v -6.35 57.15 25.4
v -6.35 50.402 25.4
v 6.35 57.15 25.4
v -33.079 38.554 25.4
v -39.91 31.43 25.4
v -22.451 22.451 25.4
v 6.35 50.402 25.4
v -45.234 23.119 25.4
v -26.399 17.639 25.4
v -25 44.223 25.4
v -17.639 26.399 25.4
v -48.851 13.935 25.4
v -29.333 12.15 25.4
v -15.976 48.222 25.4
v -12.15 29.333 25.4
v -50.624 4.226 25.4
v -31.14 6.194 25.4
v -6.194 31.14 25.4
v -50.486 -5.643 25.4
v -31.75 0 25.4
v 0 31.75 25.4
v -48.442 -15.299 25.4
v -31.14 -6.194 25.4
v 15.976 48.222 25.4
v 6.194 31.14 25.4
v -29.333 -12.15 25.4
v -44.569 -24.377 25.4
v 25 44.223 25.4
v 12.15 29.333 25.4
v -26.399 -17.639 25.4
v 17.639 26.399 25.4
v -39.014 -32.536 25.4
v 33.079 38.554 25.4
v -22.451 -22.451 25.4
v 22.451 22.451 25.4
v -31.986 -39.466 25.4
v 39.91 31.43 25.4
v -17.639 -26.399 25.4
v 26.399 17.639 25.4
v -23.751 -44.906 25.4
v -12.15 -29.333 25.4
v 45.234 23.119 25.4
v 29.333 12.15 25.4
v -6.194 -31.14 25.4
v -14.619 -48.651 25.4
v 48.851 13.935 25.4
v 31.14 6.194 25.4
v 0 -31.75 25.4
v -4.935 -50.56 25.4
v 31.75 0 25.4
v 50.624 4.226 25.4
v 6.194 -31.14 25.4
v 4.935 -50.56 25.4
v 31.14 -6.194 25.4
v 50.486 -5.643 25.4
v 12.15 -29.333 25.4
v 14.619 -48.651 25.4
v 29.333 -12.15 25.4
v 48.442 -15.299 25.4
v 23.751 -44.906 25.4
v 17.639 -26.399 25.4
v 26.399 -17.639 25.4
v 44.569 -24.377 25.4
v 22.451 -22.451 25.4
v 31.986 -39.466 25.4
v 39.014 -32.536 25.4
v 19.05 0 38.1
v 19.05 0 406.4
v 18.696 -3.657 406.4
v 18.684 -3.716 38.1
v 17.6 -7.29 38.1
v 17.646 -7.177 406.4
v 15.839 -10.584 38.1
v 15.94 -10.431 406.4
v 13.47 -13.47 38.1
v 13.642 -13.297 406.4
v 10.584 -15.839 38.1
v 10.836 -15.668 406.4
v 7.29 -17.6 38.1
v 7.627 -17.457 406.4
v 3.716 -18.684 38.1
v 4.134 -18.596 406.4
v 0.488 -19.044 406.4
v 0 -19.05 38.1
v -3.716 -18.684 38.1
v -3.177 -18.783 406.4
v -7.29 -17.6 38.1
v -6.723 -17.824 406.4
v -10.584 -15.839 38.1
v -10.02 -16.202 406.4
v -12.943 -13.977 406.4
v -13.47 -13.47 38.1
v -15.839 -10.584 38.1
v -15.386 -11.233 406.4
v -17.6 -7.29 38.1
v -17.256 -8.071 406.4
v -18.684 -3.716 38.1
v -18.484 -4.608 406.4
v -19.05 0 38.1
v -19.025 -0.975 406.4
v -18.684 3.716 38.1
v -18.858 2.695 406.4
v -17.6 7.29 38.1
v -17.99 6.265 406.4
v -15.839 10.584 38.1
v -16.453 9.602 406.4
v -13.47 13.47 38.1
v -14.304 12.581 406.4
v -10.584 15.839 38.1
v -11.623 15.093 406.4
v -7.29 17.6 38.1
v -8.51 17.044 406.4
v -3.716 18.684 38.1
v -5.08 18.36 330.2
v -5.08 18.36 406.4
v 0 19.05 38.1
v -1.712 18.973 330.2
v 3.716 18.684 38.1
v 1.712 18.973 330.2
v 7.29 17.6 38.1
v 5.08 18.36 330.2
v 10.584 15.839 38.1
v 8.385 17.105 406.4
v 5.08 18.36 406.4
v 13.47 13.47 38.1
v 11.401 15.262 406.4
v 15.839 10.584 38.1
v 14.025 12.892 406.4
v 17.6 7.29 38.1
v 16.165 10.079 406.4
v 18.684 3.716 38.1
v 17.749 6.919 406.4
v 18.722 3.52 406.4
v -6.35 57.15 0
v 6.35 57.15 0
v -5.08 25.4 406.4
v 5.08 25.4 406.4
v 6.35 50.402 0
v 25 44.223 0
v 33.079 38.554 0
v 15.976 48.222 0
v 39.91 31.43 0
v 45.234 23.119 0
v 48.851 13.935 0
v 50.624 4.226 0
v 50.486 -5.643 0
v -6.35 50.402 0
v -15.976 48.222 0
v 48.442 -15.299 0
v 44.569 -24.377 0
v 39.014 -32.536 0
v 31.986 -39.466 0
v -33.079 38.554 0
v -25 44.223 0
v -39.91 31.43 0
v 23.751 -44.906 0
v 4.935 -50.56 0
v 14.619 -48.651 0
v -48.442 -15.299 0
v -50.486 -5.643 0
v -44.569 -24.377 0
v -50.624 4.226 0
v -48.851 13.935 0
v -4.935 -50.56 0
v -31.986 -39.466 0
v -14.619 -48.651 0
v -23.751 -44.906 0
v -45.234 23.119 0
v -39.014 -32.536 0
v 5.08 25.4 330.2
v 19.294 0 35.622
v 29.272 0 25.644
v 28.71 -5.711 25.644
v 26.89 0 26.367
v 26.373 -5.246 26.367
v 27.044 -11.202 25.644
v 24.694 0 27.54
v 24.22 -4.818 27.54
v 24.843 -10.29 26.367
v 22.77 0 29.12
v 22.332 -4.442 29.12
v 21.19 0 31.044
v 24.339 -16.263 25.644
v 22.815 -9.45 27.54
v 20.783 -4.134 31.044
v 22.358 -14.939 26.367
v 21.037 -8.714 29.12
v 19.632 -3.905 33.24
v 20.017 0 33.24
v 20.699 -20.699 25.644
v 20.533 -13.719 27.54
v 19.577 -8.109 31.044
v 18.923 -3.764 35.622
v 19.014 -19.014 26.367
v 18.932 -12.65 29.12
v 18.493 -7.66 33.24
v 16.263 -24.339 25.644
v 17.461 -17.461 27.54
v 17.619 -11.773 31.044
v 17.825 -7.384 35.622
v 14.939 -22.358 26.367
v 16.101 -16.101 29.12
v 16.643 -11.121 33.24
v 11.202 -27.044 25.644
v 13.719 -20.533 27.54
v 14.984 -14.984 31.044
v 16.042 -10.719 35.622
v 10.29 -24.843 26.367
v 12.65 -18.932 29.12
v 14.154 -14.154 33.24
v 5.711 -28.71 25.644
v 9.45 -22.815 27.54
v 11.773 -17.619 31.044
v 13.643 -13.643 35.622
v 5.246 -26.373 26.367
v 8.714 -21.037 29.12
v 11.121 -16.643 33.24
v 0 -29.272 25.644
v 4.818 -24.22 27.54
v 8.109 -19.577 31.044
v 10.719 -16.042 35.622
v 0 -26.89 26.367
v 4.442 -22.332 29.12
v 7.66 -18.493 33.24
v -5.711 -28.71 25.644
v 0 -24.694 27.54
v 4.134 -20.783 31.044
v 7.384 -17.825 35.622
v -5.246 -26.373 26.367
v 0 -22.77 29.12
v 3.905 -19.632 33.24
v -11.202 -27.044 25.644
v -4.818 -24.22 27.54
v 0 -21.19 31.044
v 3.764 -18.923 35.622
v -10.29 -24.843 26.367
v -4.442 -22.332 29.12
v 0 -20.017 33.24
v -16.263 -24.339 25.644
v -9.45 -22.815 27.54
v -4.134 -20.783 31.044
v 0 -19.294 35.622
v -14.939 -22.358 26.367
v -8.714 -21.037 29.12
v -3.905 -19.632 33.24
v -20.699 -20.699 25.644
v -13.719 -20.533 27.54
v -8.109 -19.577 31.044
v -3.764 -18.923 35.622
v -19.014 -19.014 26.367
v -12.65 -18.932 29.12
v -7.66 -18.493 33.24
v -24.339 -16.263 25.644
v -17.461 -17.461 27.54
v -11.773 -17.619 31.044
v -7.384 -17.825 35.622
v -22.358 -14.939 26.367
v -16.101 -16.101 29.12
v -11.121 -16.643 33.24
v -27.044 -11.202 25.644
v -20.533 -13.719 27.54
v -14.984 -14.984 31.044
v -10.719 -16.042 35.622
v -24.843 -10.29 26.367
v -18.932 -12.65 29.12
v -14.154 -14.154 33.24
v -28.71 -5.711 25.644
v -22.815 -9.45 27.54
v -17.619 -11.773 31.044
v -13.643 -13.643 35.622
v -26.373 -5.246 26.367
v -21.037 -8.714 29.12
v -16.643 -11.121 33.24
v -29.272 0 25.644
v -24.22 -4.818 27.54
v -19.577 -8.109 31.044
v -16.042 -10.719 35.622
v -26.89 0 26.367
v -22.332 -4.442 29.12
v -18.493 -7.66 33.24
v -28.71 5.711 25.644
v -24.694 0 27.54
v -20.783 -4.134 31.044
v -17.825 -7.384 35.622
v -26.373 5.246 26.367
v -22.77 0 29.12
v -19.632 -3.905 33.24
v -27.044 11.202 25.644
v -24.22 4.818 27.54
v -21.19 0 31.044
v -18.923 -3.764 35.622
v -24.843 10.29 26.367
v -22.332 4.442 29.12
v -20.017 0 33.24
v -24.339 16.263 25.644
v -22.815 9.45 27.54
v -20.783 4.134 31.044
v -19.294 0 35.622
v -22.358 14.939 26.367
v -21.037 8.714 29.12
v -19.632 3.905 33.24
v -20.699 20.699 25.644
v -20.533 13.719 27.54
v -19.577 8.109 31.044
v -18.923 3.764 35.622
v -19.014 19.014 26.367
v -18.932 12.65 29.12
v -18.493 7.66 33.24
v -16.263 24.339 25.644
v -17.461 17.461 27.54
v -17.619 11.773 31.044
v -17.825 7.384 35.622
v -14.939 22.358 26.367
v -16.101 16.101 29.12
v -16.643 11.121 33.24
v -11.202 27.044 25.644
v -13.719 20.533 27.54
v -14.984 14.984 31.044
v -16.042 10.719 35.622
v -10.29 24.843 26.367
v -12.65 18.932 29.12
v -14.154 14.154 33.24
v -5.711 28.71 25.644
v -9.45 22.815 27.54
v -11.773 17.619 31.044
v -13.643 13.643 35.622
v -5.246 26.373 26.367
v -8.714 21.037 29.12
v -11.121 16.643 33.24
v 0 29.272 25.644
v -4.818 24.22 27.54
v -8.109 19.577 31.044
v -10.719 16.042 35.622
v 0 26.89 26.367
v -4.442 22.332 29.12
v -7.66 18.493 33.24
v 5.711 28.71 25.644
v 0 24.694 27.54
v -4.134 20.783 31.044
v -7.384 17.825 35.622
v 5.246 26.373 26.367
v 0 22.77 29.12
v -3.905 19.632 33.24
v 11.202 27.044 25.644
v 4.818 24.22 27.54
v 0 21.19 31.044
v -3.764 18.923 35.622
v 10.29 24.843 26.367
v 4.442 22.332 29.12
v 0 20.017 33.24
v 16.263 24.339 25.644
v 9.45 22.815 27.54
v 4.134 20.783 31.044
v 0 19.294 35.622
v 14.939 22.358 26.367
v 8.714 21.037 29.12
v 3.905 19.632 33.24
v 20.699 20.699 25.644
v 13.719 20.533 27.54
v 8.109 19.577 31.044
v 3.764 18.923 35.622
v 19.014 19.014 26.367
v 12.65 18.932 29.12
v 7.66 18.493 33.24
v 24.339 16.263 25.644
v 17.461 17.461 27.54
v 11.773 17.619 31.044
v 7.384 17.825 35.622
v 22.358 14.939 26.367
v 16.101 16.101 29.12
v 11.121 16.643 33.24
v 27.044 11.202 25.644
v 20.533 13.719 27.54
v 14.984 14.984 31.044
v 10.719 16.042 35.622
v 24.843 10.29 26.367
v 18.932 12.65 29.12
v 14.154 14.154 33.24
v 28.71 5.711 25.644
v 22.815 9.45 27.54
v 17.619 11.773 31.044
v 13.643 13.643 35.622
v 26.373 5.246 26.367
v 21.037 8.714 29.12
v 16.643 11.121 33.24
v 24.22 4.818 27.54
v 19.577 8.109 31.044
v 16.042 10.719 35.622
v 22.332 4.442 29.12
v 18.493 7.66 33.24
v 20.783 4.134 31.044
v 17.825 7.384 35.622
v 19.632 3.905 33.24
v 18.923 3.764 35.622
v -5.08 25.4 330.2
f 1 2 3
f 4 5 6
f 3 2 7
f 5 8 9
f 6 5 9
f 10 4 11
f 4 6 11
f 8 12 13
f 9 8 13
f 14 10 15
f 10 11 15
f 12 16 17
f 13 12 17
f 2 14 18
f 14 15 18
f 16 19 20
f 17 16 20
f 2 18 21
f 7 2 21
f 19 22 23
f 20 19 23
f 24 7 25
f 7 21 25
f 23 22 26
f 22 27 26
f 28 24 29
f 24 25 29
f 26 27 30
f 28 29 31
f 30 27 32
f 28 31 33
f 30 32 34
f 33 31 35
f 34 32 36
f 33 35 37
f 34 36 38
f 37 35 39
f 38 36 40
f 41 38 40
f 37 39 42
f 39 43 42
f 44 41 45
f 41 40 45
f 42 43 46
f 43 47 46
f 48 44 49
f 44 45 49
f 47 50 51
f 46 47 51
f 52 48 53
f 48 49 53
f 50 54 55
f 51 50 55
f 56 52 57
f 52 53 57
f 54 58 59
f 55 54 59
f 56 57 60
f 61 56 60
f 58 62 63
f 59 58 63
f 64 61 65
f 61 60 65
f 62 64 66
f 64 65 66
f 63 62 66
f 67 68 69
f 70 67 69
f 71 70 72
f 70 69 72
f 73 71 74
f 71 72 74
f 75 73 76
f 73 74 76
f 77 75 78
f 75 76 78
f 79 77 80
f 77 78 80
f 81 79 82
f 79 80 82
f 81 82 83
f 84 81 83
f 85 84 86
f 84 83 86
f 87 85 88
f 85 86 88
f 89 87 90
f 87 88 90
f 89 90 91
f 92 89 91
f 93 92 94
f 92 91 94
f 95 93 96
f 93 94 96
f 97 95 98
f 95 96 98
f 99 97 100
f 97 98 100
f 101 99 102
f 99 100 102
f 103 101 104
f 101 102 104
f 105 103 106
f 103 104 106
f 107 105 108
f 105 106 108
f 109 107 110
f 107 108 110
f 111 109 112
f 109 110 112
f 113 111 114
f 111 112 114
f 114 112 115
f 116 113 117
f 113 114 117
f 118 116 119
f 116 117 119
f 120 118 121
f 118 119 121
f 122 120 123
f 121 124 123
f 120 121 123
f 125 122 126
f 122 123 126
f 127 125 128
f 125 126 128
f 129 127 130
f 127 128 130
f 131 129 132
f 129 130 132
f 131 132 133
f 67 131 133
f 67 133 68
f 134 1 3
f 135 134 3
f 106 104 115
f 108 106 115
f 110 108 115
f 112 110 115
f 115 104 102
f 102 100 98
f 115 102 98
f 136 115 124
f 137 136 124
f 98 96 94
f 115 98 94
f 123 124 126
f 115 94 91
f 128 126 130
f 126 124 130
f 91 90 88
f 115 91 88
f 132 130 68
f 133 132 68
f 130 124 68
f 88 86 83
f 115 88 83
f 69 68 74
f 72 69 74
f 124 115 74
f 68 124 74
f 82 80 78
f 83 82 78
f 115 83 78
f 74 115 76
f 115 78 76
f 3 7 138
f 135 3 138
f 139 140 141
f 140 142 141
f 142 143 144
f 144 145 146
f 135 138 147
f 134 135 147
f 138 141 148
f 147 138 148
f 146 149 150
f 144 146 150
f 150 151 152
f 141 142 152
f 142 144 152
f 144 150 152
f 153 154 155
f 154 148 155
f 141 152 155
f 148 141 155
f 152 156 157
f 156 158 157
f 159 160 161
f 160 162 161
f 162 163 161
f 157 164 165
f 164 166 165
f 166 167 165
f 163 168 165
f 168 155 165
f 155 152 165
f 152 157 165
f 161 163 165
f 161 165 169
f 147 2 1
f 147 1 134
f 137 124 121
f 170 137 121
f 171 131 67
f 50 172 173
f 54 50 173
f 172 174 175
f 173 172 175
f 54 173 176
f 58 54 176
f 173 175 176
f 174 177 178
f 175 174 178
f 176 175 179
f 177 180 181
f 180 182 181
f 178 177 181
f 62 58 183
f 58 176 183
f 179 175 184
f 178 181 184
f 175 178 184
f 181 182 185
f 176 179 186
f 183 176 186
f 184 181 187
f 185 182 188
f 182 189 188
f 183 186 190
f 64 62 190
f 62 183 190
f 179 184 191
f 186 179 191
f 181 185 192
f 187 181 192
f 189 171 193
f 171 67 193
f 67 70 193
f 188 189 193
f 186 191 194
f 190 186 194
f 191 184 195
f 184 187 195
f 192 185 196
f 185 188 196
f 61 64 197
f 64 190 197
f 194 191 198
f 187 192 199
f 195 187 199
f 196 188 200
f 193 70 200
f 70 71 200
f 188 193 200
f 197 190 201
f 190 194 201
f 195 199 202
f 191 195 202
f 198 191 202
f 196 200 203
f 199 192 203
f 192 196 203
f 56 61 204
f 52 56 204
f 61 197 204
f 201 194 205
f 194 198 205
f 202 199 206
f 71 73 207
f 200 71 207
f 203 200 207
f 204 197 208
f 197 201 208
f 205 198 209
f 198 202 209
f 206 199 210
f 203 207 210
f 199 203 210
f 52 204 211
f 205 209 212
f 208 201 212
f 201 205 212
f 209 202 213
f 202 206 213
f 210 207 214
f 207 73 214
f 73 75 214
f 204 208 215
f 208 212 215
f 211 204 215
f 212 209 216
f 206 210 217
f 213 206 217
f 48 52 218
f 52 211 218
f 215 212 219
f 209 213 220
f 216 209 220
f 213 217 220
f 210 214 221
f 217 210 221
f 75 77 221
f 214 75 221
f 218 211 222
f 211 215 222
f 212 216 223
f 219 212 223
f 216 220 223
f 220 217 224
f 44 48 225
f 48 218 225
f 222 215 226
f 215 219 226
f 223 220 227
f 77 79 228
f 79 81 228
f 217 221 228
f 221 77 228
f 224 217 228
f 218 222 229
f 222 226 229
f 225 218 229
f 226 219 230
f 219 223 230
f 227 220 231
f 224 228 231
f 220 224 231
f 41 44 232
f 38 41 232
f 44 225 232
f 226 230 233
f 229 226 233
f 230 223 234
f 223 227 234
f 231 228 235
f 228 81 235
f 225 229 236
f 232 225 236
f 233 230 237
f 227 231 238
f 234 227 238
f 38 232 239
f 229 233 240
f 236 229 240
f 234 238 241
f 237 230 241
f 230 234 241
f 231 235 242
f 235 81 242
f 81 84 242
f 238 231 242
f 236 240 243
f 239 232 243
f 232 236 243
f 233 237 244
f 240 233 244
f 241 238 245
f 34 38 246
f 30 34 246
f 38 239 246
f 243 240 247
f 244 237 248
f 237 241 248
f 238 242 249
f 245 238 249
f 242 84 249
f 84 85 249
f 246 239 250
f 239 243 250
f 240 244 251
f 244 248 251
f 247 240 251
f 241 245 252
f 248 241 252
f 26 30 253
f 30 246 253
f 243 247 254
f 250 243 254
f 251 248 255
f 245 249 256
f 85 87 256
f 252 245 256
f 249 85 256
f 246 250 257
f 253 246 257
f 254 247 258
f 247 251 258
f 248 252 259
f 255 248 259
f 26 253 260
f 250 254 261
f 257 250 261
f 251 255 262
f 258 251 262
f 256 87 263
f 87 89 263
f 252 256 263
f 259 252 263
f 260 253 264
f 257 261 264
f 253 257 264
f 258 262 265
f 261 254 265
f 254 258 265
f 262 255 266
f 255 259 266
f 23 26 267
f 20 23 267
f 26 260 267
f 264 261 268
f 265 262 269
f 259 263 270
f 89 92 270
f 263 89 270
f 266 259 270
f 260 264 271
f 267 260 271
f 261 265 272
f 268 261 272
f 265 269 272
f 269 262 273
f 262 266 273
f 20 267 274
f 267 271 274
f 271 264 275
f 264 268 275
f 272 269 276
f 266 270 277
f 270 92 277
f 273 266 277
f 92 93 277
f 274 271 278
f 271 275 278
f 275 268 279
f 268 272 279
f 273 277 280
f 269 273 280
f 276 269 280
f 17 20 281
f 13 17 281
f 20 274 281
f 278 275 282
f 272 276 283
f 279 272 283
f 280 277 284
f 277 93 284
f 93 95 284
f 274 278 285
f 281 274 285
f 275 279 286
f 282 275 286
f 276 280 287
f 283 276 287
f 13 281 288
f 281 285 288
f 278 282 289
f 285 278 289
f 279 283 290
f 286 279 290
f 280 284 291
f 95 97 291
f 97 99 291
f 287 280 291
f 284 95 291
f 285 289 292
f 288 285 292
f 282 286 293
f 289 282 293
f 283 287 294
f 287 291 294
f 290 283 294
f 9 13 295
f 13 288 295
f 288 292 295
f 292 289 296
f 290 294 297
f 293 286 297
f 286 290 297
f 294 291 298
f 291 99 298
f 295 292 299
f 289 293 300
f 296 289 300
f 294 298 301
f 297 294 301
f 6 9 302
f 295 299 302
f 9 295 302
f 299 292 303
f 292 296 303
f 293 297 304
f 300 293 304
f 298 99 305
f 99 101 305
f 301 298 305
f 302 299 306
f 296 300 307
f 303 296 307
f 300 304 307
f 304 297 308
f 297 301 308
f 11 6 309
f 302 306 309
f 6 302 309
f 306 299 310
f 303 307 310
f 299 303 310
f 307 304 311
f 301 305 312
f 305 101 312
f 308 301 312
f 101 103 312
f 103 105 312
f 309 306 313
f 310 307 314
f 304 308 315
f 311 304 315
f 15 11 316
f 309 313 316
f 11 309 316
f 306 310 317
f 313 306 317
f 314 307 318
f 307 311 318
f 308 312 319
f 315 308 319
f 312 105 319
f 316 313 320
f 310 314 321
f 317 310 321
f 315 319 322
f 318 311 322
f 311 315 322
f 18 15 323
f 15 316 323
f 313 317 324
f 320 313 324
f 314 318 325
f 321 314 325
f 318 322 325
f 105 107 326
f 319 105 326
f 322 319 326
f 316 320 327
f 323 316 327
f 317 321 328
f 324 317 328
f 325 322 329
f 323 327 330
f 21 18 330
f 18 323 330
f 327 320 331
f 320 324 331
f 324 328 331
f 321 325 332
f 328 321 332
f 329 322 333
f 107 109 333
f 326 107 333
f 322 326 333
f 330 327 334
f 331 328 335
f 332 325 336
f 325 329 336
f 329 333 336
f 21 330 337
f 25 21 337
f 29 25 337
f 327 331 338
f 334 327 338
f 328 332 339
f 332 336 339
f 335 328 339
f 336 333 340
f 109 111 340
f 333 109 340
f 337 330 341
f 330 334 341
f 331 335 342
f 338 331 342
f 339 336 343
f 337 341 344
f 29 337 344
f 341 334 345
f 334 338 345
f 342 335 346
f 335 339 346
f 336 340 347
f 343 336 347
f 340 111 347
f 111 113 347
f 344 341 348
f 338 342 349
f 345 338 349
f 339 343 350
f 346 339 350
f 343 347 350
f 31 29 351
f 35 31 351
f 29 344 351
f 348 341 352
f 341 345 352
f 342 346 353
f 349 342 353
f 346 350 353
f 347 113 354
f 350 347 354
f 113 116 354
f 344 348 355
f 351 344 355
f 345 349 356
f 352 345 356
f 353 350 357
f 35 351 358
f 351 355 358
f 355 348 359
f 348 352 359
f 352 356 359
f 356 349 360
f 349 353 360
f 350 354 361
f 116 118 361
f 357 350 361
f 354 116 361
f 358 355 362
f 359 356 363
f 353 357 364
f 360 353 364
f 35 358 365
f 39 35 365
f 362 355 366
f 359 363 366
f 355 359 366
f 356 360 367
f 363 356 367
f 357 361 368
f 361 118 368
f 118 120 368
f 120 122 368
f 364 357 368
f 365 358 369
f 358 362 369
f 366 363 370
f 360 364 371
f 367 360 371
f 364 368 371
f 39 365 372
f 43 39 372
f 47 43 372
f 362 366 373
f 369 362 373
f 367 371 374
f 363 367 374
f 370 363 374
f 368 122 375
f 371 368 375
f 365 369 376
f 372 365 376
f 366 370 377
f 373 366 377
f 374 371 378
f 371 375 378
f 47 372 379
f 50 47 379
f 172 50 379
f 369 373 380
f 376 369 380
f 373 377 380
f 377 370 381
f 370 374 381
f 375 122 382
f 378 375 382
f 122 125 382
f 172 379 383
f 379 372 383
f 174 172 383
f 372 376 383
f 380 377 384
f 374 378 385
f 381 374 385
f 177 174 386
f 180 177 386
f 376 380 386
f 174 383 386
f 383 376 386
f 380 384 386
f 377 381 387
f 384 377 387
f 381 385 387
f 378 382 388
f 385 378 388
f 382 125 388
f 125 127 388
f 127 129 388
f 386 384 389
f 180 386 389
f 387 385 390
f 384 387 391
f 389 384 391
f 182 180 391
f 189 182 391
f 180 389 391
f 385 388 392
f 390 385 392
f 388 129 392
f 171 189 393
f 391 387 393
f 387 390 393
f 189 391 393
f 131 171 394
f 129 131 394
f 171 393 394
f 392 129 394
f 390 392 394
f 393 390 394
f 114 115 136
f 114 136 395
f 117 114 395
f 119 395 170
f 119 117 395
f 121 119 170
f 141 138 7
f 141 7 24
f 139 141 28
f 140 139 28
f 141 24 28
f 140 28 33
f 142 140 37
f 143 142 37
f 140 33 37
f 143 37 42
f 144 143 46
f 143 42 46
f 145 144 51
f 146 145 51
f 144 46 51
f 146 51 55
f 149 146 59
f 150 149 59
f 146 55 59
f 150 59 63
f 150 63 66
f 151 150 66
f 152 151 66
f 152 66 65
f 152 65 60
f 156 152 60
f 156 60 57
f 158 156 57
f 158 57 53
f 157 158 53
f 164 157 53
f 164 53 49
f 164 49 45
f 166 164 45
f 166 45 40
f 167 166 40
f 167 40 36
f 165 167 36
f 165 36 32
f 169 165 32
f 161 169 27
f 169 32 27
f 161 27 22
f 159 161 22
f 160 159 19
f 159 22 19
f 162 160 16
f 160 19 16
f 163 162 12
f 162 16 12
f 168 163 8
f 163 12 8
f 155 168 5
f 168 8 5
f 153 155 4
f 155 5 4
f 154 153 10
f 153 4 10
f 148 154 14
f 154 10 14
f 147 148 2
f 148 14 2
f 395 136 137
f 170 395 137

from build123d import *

# Parameters (mm, degrees)
SKETCH2_W           = 12.7
SKETCH2_H           = 25.4
BOSS_EXTRUDE2_DEPTH = 57.15
SKETCH3_W           = 10.16
SKETCH3_H           = 76.2
BOSS_EXTRUDE3_DEPTH = 25.4


with BuildPart() as part:
    # Sketch2 → Boss-Extrude2 (new body)
    with BuildSketch(Plane(origin=(0, 0, 0), x_dir=(1, 0, 0), z_dir=(0, 1, 0))):
        with Locations((0, -12.7)):
            Rectangle(SKETCH2_W, SKETCH2_H)
    extrude(amount=BOSS_EXTRUDE2_DEPTH)



with BuildPart() as body_2:
    # Sketch3 → Boss-Extrude3 (new body)
    with BuildSketch(Plane(origin=(0, 0, 0), x_dir=(1, 0, 0), z_dir=(0, 1, 0))):
        with Locations((0, -368.3)):
            Rectangle(SKETCH3_W, SKETCH3_H)
    extrude(amount=BOSS_EXTRUDE3_DEPTH)


with BuildPart() as part_1:
    add(part.part)

    add(body_2.part)  # Revolve2 merges body 2
    # Sketch4 → Revolve2 (revolve)
    with BuildSketch(Plane(origin=(0, 0, 0), x_dir=(0, 0, -1), z_dir=(1, 0, 0)), mode=Mode.PRIVATE) as revolve2_sk:
        with BuildLine():
            Line((0, 0), (0, 50.8))
            Line((0, 50.8), (-25.4, 50.8))
            Line((-25.4, 50.8), (-25.4, 31.75))
            ThreePointArc((-25.4, 31.75), (-29.119743879, 22.769743879), (-38.1, 19.05))
            Line((-38.1, 19.05), (-406.4, 19.05))
            Line((-406.4, 19.05), (-406.4, 0))
            Line((-406.4, 0), (0, 0))
        make_face()
    revolve(revolve2_sk.sketch.rotate(Axis((0, 0, 1000), (0, 0, -1)), 90), axis=Axis((0, 0, 1000), (0, 0, -1)))


solid = part_1.part
